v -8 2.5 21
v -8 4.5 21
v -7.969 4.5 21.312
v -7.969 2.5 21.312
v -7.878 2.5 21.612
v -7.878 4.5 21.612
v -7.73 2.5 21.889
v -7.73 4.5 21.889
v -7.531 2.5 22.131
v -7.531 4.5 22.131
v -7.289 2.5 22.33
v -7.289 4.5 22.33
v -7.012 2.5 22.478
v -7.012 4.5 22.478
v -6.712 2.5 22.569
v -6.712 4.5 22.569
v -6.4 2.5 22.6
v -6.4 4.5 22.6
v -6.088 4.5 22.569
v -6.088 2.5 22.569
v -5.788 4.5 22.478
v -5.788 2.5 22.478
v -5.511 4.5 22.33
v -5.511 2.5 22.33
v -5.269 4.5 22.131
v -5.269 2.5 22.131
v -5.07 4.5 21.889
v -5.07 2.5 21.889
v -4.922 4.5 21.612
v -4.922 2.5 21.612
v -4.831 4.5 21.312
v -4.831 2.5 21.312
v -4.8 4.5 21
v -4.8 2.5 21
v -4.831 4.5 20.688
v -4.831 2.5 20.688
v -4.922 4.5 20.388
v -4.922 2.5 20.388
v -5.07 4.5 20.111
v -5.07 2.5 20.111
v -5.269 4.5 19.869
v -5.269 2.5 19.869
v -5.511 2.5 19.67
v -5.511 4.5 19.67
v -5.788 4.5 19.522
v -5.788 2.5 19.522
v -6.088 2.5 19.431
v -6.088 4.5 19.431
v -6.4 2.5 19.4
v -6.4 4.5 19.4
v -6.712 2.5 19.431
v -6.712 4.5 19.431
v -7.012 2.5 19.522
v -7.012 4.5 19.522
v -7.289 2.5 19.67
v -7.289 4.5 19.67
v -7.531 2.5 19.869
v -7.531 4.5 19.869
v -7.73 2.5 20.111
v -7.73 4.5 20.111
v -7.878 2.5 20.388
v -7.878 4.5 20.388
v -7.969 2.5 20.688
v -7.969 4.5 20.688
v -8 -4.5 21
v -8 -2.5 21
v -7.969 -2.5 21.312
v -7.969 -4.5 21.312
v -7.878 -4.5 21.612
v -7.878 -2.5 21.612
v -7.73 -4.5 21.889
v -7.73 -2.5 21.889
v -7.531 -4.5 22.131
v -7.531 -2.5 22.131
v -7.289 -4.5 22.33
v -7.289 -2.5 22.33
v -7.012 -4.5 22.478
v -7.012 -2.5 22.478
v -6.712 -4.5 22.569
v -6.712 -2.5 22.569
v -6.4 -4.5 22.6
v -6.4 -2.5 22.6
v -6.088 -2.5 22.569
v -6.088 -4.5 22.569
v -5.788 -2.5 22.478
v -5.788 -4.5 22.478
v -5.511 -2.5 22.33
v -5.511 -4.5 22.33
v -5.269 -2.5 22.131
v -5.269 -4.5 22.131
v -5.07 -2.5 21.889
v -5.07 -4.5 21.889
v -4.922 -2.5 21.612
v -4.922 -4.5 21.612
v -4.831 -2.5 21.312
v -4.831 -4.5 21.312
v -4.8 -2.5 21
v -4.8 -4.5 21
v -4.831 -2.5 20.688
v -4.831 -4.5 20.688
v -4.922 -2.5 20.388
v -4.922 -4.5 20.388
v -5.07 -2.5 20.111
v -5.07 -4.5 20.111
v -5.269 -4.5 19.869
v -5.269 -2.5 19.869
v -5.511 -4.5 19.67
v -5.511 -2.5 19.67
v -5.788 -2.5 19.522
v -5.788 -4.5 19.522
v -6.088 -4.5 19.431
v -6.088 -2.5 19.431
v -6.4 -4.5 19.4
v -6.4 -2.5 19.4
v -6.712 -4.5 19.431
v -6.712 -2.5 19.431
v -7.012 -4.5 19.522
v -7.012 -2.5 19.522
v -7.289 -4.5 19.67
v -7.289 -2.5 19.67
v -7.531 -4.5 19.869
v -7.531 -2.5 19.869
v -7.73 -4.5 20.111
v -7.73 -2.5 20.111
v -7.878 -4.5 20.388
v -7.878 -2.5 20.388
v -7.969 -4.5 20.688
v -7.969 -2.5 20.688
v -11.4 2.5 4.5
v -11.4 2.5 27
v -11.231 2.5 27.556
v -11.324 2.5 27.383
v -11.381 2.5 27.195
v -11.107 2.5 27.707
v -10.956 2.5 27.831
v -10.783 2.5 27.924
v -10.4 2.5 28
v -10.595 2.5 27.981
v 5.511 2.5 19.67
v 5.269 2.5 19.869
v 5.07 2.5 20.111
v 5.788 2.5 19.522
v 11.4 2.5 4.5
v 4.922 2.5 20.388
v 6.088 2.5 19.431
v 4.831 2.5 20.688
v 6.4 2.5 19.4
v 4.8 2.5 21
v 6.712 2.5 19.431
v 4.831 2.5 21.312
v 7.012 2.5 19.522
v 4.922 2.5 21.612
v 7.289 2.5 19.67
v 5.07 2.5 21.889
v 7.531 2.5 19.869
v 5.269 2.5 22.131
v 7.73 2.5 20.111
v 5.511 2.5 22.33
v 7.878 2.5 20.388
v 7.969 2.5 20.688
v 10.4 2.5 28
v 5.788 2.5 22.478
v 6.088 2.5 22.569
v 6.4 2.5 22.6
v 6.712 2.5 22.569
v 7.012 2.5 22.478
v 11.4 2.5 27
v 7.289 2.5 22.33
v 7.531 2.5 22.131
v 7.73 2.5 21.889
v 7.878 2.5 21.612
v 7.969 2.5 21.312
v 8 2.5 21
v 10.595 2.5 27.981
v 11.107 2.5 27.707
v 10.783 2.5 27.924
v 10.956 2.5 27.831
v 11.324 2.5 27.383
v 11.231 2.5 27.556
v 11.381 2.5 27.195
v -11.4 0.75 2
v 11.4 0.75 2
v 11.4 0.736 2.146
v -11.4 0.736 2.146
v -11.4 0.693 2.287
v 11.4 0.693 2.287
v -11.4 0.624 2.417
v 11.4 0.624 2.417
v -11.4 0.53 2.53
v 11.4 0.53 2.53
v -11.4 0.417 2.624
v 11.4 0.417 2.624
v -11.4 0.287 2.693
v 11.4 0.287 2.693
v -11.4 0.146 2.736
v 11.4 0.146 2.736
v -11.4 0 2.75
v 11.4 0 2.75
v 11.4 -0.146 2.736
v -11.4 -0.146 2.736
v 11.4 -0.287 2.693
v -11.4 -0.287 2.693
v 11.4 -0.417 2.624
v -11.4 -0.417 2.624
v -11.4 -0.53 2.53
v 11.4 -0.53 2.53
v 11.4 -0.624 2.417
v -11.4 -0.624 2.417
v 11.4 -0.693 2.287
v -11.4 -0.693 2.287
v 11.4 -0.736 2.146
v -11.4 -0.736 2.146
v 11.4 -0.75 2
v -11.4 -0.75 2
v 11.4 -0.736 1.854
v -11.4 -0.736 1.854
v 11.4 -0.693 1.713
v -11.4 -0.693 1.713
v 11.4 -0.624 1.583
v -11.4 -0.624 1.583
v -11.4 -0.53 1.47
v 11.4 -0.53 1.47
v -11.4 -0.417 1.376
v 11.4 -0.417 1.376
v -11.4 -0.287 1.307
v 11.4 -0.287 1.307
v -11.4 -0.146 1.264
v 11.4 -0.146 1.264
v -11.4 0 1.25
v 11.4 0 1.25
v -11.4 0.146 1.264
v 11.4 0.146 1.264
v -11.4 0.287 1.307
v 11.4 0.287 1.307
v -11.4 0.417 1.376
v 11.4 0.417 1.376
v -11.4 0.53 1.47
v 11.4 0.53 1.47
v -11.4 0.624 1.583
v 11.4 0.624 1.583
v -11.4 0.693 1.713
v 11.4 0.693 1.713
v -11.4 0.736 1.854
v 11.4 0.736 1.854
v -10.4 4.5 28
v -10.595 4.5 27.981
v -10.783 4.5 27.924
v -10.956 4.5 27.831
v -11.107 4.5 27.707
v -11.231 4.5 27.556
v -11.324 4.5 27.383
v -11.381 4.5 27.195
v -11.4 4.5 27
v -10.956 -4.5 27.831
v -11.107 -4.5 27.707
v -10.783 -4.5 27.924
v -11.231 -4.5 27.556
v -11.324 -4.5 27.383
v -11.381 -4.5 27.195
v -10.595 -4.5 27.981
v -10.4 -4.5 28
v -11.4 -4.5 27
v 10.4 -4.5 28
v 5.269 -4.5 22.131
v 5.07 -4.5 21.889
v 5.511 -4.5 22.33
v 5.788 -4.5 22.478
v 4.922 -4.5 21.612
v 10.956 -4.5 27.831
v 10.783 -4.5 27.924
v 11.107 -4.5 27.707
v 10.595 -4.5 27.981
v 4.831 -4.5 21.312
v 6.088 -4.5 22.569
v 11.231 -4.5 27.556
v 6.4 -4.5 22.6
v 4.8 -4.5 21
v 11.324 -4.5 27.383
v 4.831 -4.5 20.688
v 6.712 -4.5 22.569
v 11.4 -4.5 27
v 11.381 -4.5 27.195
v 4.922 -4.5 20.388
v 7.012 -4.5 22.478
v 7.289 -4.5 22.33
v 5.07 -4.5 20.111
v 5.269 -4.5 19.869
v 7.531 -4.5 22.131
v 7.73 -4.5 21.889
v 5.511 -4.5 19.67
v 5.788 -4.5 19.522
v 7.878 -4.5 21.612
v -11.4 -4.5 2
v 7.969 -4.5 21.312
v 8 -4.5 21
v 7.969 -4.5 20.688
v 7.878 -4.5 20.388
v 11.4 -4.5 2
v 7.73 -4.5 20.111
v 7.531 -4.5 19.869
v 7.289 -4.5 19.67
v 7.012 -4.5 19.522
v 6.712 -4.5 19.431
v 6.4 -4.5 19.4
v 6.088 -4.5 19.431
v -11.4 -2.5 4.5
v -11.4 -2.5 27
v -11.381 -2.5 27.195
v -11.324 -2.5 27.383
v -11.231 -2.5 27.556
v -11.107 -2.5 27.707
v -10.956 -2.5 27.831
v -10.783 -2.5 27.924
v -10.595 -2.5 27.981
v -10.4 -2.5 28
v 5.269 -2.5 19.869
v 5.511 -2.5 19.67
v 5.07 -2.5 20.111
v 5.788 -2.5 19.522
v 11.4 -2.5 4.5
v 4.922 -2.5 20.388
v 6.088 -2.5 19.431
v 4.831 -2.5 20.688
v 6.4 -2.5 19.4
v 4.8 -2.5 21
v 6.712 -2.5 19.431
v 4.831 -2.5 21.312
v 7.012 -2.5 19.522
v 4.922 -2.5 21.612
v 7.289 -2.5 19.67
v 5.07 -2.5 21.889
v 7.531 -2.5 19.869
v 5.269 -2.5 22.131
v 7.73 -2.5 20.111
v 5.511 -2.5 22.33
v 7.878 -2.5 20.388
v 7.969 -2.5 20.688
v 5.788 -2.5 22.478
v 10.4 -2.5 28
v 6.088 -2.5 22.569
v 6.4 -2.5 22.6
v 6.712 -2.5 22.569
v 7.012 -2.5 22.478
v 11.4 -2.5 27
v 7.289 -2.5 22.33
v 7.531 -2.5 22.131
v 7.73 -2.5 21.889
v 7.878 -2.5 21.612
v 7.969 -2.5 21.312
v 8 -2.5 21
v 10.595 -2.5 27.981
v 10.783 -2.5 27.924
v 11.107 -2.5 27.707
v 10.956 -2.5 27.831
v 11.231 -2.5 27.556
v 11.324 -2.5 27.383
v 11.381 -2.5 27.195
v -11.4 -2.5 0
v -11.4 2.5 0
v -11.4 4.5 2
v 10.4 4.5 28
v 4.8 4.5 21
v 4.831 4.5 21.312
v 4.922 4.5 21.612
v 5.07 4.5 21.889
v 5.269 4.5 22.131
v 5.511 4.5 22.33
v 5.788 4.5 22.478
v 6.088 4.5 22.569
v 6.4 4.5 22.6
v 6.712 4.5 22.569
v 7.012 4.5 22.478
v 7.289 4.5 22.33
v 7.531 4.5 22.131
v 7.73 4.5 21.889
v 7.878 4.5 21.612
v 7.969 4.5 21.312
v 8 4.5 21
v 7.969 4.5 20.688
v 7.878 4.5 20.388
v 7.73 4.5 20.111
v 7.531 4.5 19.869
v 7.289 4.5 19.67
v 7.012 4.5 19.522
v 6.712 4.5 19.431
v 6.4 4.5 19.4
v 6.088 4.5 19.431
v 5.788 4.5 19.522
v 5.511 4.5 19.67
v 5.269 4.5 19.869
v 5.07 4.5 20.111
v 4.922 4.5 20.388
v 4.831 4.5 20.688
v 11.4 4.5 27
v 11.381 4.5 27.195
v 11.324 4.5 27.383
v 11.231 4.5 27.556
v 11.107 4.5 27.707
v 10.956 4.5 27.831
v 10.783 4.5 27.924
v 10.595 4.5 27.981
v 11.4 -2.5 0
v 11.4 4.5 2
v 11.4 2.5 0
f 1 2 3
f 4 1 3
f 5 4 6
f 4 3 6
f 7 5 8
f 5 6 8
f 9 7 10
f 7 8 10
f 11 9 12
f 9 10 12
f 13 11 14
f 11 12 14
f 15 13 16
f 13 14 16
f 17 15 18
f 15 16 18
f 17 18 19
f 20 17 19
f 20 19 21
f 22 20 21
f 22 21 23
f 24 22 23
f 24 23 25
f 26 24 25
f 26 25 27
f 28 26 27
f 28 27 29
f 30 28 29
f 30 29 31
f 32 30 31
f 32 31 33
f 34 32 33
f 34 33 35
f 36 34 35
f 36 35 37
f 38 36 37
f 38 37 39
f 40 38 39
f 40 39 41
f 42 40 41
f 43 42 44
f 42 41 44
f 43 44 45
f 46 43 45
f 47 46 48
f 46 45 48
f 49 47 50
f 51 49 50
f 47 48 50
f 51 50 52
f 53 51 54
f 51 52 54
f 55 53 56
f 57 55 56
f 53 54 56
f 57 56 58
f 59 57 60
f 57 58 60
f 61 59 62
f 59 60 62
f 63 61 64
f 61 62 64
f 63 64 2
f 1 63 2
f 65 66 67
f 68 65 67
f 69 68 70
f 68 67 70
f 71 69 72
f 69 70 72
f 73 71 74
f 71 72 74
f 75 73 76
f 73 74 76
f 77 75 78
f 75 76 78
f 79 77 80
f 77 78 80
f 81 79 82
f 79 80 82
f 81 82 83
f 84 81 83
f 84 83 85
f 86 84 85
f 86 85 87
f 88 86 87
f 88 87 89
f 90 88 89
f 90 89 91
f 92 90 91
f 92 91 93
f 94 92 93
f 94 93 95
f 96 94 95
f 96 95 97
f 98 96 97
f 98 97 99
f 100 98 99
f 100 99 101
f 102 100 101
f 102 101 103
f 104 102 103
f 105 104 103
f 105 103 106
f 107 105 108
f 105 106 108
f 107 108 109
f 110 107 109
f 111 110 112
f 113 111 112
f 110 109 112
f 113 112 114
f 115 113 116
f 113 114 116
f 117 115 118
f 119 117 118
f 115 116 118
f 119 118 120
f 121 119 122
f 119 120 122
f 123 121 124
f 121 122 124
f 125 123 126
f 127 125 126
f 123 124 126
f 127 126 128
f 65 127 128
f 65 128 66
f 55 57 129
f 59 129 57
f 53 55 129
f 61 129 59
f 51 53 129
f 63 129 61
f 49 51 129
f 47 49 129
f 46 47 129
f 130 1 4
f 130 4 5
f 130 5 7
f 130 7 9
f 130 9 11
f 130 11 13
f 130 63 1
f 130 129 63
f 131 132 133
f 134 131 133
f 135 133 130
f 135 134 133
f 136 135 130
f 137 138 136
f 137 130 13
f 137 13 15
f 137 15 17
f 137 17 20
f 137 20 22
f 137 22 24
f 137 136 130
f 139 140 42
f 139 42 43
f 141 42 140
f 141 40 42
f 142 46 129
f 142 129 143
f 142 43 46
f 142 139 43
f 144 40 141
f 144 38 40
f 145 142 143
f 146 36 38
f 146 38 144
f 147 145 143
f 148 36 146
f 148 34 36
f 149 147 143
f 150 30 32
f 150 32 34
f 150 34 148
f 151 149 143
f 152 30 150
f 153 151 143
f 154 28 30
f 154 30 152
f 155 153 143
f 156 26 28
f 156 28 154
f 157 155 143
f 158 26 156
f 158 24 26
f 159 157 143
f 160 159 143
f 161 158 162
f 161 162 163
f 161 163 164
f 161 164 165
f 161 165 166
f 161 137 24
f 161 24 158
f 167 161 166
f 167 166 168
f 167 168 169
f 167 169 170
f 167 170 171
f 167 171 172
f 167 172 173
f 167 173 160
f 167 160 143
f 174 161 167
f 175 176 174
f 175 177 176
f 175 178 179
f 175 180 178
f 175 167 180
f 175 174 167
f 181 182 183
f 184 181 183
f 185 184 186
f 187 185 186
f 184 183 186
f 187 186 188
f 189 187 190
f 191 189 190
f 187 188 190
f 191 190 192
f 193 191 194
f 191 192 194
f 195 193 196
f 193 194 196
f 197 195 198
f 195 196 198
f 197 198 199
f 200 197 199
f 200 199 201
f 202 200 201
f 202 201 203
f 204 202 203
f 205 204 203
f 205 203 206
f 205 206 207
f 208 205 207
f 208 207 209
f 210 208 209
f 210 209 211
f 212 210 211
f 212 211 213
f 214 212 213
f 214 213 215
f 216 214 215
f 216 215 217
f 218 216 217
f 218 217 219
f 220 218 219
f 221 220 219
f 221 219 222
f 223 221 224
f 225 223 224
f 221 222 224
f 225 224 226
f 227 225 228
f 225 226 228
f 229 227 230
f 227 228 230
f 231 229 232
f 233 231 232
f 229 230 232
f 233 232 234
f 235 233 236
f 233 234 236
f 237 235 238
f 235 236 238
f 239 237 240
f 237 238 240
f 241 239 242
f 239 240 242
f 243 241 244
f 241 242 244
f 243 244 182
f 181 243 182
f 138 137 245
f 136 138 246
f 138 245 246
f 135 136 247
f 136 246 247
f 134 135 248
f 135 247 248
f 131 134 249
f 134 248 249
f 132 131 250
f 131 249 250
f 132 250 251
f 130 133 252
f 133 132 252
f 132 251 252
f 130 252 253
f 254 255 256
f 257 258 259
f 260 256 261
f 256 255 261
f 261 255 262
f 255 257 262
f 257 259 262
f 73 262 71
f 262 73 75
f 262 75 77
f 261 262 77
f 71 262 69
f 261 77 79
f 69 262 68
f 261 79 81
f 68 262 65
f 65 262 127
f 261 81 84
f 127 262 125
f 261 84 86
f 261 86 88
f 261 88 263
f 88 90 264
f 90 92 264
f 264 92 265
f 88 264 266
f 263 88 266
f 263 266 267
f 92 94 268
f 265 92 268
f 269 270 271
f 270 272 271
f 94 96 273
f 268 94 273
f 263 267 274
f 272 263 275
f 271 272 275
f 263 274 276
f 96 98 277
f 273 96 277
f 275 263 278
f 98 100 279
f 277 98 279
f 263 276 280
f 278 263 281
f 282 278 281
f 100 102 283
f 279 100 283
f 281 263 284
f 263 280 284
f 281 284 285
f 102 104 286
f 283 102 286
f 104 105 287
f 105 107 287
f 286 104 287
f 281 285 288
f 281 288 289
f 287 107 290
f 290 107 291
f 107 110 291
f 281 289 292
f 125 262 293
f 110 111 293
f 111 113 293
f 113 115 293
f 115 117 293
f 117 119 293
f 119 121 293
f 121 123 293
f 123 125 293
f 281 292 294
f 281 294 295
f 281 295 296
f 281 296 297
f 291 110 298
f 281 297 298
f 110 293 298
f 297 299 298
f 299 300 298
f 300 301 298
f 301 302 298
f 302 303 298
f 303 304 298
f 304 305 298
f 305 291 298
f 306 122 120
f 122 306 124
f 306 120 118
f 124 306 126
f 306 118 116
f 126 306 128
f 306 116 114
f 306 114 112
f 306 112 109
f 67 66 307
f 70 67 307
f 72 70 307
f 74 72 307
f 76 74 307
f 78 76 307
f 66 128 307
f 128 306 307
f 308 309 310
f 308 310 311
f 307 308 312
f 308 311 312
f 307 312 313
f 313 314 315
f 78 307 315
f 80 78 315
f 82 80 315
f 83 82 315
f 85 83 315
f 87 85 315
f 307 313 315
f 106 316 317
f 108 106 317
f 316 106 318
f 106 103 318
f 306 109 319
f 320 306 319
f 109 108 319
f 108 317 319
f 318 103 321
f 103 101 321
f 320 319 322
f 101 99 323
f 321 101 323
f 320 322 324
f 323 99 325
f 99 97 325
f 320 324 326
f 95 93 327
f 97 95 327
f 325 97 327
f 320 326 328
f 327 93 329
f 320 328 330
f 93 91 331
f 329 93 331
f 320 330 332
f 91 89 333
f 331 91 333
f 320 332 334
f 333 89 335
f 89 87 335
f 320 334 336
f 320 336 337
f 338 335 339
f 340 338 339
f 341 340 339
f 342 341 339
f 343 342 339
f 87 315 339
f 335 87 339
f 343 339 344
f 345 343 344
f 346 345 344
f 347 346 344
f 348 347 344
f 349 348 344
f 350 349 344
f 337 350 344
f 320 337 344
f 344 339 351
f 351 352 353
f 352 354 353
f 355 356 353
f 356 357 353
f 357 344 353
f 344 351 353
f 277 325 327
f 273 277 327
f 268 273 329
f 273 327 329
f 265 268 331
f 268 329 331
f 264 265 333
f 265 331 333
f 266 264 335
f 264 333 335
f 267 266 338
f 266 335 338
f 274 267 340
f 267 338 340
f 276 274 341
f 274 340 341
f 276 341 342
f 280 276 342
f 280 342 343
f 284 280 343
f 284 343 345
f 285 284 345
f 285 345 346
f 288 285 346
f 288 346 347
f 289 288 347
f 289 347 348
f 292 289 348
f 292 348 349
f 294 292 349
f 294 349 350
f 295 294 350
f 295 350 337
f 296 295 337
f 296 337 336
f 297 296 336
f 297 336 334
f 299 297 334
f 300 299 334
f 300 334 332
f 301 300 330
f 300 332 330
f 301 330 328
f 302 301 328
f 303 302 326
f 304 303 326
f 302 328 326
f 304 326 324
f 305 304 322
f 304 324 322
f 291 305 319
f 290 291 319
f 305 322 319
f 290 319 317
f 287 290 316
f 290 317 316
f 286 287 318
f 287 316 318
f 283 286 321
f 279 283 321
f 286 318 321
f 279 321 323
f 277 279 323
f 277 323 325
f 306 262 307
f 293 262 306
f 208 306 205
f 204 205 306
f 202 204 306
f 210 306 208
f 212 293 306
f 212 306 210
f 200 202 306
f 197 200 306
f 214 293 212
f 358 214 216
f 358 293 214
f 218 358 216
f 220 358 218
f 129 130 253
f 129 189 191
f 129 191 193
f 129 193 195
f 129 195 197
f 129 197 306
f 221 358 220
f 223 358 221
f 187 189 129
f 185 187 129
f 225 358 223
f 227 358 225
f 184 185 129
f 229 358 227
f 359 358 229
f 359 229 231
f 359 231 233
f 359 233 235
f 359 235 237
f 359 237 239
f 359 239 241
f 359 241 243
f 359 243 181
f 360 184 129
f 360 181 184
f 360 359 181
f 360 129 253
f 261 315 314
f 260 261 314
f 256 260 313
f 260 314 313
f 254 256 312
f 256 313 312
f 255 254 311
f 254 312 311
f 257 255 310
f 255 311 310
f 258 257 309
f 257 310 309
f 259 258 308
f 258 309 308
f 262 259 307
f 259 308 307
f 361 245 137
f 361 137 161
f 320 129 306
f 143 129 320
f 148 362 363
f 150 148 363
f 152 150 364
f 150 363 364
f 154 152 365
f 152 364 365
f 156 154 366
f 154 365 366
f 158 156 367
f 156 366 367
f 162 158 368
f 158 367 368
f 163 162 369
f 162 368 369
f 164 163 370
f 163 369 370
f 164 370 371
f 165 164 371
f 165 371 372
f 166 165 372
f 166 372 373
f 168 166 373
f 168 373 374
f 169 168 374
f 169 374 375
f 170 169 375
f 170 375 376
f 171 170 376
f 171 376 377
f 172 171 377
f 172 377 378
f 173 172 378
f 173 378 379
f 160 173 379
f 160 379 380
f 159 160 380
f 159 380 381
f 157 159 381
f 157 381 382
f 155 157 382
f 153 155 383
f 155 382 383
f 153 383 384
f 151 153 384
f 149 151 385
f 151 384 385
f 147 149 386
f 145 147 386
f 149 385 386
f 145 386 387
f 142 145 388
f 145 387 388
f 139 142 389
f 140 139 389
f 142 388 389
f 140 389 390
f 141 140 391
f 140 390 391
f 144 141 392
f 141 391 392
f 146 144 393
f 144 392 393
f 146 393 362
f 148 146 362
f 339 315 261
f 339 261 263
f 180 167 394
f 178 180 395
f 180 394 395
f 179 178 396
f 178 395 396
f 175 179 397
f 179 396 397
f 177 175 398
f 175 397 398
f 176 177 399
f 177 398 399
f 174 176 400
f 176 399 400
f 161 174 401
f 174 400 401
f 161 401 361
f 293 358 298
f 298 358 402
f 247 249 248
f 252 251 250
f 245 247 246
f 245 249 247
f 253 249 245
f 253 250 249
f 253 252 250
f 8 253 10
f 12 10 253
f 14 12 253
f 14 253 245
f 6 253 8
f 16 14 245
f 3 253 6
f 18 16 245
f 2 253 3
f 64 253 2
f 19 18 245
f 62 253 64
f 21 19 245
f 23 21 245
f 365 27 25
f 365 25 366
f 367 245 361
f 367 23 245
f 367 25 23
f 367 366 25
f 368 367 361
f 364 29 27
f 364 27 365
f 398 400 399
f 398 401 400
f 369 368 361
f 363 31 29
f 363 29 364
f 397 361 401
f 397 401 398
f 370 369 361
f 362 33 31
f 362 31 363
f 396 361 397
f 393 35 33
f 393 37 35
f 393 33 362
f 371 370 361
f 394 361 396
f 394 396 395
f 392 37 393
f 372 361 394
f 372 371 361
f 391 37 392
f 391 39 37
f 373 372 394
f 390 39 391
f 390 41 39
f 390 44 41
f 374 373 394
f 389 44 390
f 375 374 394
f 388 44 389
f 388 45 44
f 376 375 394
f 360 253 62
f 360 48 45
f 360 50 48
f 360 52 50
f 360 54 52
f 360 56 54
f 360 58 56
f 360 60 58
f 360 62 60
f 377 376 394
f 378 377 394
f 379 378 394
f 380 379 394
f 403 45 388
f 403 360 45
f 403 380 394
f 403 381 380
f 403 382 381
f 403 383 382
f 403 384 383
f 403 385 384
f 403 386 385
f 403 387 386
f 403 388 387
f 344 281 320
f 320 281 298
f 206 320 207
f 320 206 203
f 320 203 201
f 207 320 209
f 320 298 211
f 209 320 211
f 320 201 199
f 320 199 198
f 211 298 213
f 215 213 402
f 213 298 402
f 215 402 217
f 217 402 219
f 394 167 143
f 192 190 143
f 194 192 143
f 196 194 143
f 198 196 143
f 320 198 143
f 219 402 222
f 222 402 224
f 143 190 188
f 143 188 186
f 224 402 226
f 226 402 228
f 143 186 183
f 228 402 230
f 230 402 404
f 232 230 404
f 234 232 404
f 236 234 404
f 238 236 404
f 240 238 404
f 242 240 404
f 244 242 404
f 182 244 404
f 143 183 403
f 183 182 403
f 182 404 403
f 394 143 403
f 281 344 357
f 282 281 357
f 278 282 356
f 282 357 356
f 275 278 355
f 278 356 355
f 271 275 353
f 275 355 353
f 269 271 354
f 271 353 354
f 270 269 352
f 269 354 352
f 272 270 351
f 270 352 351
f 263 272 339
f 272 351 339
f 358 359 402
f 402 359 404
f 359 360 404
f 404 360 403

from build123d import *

# Parameters (mm, degrees)
SKETCH_W        = 22.8
SKETCH_H        = 9
PAD_DEPTH       = 28
FILLET_R        = 1
FILLET001_R     = 1
SKETCH001_W     = 27.634385
SKETCH001_H     = 5
POCKET_DEPTH    = 23.5
SKETCH002_R     = 0.75
POCKET001_DEPTH = 30
SKETCH003_R     = 1.6
POCKET002_DEPTH = 20
CHAMFER_SIZE    = 2
CHAMFER001_SIZE = 2


with BuildPart() as part:
    # Sketch → Pad (new body)
    with BuildSketch(Plane.XY):
        Rectangle(SKETCH_W, SKETCH_H)
    extrude(amount=PAD_DEPTH)

    # Fillet
    fillet_edges = [part.edges().sort_by_distance(p)[0] for p in [
        (11.4, 0, 28),
    ]]
    fillet(fillet_edges, radius=FILLET_R)

    # Fillet001
    fillet001_edges = [part.edges().sort_by_distance(p)[0] for p in [
        (-11.4, 0, 28),
    ]]
    fillet(fillet001_edges, radius=FILLET001_R)

    # Sketch001 (on Face2 of Fillet001) → Pocket (cut)
    with BuildSketch(Plane.XY.offset(28)):
        with Locations((-0.375196, 0)):
            Rectangle(SKETCH001_W, SKETCH001_H)
    extrude(amount=-POCKET_DEPTH, mode=Mode.SUBTRACT)

    # Sketch002 (on Face6 of Pocket) → Pocket001 (cut)
    with BuildSketch(Plane.YZ.offset(11.4)):
        with Locations((0, 2)):
            Circle(SKETCH002_R)
    extrude(amount=-POCKET001_DEPTH, mode=Mode.SUBTRACT)

    # Sketch003 (on Face1 of Pocket) → Pocket002 (cut)
    with BuildSketch(Plane(origin=(0, 4.5, 0), x_dir=(-1, 0, 0), z_dir=(0, 1, 0))):
        with Locations((-6.4, 21)):
            Circle(SKETCH003_R)
        with Locations((6.4, 21)):
            Circle(SKETCH003_R)
    extrude(amount=-POCKET002_DEPTH, mode=Mode.SUBTRACT)

    # Chamfer
    chamfer_edges = [part.edges().sort_by_distance(p)[0] for p in [
        (0, -4.5, 0),
    ]]
    chamfer(chamfer_edges, length=CHAMFER_SIZE)

    # Chamfer001
    chamfer001_edges = [part.edges().sort_by_distance(p)[0] for p in [
        (0, 4.5, 0),
    ]]
    chamfer(chamfer001_edges, length=CHAMFER001_SIZE)


solid = part.part
